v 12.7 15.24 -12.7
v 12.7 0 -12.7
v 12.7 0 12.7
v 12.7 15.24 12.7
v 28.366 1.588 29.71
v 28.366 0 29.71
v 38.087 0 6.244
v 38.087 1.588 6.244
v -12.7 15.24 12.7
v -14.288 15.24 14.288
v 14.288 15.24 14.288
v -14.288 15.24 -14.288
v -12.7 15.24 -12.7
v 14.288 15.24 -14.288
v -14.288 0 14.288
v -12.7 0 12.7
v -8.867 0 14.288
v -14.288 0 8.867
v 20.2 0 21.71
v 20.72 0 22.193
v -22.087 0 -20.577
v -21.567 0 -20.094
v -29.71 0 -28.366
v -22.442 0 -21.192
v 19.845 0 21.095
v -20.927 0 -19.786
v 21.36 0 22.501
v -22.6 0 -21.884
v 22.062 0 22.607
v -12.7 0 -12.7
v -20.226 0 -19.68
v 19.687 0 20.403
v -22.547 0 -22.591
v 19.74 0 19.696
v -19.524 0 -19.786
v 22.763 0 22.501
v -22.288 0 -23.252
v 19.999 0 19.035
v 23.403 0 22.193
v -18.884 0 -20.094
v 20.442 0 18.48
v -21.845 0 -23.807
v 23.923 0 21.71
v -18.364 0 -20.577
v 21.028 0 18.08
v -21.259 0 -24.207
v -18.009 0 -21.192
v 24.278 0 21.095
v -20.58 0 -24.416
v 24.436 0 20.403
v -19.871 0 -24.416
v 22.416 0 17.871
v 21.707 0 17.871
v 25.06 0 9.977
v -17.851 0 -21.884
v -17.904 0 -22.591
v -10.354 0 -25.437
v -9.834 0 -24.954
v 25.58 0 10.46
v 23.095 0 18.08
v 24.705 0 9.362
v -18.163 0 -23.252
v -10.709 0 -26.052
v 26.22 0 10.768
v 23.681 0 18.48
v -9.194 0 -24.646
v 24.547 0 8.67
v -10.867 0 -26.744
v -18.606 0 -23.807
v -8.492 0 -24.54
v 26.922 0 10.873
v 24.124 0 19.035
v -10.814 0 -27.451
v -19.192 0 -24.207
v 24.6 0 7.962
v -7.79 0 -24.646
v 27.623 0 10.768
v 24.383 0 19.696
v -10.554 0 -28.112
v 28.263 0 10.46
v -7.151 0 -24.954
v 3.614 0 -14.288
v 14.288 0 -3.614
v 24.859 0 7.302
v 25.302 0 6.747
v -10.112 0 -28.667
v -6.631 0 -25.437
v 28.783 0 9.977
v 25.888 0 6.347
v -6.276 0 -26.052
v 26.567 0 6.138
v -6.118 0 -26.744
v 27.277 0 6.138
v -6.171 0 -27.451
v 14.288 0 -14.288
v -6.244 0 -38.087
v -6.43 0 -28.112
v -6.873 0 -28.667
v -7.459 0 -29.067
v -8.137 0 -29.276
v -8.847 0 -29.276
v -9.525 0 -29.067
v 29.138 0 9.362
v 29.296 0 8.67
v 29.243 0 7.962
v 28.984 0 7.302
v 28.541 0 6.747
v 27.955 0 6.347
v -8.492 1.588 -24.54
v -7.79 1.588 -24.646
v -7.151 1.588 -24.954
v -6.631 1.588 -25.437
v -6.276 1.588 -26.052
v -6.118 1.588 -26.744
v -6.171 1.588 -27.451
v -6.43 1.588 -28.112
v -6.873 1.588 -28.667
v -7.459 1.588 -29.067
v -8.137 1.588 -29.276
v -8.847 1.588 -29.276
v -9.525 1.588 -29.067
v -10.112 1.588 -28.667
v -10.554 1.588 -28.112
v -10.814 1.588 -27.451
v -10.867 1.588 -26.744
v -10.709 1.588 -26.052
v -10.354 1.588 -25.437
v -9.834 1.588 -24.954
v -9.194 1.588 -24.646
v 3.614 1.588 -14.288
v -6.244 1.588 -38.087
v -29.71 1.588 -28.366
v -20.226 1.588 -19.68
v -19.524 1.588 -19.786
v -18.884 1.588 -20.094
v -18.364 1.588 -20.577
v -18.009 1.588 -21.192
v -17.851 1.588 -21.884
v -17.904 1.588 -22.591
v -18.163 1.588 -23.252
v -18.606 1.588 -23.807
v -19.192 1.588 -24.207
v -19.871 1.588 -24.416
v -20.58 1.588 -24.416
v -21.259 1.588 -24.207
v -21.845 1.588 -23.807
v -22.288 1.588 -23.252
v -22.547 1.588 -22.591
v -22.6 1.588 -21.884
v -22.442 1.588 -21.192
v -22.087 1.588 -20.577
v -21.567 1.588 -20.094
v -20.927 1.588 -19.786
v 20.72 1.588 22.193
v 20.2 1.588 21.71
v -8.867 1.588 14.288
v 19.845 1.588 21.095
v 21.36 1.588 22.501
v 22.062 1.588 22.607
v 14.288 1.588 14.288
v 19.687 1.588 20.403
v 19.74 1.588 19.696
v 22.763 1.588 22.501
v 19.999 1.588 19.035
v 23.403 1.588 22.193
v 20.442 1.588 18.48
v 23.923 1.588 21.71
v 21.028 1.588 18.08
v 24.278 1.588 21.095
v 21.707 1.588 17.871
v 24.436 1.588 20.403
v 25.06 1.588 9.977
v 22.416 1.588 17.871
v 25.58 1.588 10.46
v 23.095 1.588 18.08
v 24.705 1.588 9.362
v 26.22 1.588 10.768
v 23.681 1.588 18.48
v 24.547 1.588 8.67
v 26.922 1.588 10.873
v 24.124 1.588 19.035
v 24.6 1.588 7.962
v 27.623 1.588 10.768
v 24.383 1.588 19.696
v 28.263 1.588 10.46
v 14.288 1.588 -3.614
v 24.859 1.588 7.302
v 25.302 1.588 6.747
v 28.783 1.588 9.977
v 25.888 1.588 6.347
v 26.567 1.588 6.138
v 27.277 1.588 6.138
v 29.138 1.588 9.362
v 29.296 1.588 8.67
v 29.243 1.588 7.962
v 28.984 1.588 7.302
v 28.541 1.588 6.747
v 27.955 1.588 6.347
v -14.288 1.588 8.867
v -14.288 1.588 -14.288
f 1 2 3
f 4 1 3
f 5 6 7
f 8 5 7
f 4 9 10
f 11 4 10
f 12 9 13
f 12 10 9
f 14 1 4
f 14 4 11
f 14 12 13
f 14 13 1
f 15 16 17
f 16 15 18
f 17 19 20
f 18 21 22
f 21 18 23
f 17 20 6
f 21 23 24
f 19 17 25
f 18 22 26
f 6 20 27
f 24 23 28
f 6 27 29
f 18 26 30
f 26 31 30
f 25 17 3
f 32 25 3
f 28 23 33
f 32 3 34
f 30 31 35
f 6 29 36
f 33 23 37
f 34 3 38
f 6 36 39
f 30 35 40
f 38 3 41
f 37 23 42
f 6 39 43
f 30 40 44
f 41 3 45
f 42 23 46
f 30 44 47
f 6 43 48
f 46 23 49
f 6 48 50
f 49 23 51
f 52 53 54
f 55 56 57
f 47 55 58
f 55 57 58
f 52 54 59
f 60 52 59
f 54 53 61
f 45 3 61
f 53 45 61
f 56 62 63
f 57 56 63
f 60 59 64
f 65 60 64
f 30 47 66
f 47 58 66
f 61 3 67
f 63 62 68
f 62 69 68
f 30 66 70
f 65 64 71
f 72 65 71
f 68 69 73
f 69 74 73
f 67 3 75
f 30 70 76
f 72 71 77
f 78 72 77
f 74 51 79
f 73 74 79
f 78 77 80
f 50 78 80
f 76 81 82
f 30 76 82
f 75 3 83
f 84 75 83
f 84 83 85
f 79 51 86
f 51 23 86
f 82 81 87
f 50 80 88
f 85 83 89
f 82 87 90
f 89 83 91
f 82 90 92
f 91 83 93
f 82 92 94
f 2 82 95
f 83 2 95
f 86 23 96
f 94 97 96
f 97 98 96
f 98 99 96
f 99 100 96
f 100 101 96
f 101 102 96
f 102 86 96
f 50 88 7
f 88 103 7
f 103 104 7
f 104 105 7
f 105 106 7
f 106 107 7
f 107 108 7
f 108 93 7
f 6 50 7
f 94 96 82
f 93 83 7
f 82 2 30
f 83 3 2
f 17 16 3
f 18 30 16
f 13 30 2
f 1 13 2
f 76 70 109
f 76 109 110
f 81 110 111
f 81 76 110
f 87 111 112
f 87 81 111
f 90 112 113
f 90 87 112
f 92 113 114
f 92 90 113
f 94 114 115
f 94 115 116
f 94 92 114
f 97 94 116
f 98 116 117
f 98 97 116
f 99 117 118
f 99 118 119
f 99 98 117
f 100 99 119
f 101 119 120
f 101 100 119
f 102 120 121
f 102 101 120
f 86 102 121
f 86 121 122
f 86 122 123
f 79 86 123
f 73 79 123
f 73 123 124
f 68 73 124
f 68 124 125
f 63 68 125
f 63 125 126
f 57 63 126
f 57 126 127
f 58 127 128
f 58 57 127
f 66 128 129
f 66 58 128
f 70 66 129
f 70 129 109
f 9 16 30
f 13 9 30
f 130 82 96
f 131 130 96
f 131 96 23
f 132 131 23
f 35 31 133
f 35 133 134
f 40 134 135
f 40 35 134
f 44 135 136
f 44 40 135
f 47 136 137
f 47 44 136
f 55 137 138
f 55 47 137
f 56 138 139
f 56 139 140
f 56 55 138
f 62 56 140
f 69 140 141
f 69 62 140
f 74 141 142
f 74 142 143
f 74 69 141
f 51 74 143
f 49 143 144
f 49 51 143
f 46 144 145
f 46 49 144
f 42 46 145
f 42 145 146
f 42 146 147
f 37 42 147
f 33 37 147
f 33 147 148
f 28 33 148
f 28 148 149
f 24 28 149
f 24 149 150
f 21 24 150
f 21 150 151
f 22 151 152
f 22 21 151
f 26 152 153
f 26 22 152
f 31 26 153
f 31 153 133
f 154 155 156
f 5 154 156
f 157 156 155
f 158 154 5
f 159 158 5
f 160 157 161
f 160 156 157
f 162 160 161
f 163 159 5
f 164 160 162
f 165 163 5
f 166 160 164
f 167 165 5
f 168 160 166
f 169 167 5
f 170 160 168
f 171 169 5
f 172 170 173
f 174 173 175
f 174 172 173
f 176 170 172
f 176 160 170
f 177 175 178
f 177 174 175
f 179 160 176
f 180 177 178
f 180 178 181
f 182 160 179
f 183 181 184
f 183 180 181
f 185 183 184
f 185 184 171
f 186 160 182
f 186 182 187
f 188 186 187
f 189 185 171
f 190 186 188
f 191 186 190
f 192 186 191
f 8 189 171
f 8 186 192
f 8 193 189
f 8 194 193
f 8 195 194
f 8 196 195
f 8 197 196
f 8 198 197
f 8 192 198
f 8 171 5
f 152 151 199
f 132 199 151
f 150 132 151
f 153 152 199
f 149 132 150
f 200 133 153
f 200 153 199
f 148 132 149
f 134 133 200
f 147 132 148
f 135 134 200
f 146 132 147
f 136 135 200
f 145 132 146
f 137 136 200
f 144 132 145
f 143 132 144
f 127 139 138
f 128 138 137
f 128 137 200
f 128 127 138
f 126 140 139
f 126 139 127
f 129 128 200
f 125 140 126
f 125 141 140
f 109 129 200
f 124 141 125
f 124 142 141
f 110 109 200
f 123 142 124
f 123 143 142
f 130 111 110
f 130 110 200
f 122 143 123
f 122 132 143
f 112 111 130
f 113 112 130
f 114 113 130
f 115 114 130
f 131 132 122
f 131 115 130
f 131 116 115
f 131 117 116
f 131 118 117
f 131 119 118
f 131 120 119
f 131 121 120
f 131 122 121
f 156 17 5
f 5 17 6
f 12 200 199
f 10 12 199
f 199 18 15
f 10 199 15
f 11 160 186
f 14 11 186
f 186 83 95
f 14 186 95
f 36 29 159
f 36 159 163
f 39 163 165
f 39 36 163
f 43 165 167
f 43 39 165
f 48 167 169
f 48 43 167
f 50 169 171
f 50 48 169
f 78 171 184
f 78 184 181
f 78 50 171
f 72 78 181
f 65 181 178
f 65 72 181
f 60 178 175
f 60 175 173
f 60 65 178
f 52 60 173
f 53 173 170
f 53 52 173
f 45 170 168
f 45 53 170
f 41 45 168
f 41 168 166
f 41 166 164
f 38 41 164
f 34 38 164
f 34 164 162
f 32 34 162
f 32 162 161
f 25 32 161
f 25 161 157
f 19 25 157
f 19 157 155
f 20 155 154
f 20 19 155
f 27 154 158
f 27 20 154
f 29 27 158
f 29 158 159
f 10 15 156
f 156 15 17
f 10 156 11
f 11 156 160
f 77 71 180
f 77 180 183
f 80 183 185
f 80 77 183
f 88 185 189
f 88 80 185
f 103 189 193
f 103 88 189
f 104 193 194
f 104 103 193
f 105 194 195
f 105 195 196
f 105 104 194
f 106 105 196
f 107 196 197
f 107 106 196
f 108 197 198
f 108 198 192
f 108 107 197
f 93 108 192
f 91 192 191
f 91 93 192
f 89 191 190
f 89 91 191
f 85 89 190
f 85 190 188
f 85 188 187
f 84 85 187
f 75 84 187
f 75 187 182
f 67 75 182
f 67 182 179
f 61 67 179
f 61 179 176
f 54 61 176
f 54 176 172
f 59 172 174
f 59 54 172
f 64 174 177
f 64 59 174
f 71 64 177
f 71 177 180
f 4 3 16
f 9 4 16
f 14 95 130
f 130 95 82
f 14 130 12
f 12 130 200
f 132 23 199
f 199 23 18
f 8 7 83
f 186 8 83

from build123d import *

# Parameters (mm, degrees)
SKETCH2_W           = 28.575
SKETCH2_H           = 28.575
SKETCH2_W_2         = 25.4
SKETCH2_H_2         = 25.4
BOSS_EXTRUDE1_DEPTH = 15.24
SKETCH2_3_R         = 2.38125
BOSS_EXTRUDE2_DEPTH = 1.5875


with BuildPart() as part:
    # Sketch2 → Boss-Extrude1 (new body)
    with BuildSketch(Plane(origin=(0, 0, 0), x_dir=(1, 0, 0), z_dir=(0, 1, 0))):
        Rectangle(SKETCH2_W, SKETCH2_H)
        Rectangle(SKETCH2_W_2, SKETCH2_H_2, mode=Mode.SUBTRACT)
    extrude(amount=BOSS_EXTRUDE1_DEPTH)

    # Sketch2<3> → Boss-Extrude2 (add)
    # profile 1 of 2: a face of its own
    with BuildSketch(Plane(origin=(0, 0, 0), x_dir=(1, 0, 0), z_dir=(0, 1, 0))):
        Polygon((-14.2875, 14.2875), (3.614173373, 14.2875), (-6.243738443, 38.086604402), (-29.710278569, 28.36644522), (-14.2875, -8.86743597), align=None)
        with Locations((-8.492237251, 26.921611065)):
            Circle(SKETCH2_3_R, mode=Mode.SUBTRACT)
        with Locations((-20.225507313, 22.061531474)):
            Circle(SKETCH2_3_R, mode=Mode.SUBTRACT)
    # profile 2 of 2: a face of its own
    with BuildSketch(Plane(origin=(0, 0, 0), x_dir=(1, 0, 0), z_dir=(0, 1, 0))):
        Polygon((14.2875, 3.614173373), (14.2875, -14.2875), (-8.86743597, -14.2875), (28.36644522, -29.710278569), (38.086604402, -6.243738443), align=None)
        with Locations((22.061531474, -20.225507313)):
            Circle(SKETCH2_3_R, mode=Mode.SUBTRACT)
        with Locations((26.921611065, -8.492237251)):
            Circle(SKETCH2_3_R, mode=Mode.SUBTRACT)
    extrude(amount=BOSS_EXTRUDE2_DEPTH)


solid = part.part
